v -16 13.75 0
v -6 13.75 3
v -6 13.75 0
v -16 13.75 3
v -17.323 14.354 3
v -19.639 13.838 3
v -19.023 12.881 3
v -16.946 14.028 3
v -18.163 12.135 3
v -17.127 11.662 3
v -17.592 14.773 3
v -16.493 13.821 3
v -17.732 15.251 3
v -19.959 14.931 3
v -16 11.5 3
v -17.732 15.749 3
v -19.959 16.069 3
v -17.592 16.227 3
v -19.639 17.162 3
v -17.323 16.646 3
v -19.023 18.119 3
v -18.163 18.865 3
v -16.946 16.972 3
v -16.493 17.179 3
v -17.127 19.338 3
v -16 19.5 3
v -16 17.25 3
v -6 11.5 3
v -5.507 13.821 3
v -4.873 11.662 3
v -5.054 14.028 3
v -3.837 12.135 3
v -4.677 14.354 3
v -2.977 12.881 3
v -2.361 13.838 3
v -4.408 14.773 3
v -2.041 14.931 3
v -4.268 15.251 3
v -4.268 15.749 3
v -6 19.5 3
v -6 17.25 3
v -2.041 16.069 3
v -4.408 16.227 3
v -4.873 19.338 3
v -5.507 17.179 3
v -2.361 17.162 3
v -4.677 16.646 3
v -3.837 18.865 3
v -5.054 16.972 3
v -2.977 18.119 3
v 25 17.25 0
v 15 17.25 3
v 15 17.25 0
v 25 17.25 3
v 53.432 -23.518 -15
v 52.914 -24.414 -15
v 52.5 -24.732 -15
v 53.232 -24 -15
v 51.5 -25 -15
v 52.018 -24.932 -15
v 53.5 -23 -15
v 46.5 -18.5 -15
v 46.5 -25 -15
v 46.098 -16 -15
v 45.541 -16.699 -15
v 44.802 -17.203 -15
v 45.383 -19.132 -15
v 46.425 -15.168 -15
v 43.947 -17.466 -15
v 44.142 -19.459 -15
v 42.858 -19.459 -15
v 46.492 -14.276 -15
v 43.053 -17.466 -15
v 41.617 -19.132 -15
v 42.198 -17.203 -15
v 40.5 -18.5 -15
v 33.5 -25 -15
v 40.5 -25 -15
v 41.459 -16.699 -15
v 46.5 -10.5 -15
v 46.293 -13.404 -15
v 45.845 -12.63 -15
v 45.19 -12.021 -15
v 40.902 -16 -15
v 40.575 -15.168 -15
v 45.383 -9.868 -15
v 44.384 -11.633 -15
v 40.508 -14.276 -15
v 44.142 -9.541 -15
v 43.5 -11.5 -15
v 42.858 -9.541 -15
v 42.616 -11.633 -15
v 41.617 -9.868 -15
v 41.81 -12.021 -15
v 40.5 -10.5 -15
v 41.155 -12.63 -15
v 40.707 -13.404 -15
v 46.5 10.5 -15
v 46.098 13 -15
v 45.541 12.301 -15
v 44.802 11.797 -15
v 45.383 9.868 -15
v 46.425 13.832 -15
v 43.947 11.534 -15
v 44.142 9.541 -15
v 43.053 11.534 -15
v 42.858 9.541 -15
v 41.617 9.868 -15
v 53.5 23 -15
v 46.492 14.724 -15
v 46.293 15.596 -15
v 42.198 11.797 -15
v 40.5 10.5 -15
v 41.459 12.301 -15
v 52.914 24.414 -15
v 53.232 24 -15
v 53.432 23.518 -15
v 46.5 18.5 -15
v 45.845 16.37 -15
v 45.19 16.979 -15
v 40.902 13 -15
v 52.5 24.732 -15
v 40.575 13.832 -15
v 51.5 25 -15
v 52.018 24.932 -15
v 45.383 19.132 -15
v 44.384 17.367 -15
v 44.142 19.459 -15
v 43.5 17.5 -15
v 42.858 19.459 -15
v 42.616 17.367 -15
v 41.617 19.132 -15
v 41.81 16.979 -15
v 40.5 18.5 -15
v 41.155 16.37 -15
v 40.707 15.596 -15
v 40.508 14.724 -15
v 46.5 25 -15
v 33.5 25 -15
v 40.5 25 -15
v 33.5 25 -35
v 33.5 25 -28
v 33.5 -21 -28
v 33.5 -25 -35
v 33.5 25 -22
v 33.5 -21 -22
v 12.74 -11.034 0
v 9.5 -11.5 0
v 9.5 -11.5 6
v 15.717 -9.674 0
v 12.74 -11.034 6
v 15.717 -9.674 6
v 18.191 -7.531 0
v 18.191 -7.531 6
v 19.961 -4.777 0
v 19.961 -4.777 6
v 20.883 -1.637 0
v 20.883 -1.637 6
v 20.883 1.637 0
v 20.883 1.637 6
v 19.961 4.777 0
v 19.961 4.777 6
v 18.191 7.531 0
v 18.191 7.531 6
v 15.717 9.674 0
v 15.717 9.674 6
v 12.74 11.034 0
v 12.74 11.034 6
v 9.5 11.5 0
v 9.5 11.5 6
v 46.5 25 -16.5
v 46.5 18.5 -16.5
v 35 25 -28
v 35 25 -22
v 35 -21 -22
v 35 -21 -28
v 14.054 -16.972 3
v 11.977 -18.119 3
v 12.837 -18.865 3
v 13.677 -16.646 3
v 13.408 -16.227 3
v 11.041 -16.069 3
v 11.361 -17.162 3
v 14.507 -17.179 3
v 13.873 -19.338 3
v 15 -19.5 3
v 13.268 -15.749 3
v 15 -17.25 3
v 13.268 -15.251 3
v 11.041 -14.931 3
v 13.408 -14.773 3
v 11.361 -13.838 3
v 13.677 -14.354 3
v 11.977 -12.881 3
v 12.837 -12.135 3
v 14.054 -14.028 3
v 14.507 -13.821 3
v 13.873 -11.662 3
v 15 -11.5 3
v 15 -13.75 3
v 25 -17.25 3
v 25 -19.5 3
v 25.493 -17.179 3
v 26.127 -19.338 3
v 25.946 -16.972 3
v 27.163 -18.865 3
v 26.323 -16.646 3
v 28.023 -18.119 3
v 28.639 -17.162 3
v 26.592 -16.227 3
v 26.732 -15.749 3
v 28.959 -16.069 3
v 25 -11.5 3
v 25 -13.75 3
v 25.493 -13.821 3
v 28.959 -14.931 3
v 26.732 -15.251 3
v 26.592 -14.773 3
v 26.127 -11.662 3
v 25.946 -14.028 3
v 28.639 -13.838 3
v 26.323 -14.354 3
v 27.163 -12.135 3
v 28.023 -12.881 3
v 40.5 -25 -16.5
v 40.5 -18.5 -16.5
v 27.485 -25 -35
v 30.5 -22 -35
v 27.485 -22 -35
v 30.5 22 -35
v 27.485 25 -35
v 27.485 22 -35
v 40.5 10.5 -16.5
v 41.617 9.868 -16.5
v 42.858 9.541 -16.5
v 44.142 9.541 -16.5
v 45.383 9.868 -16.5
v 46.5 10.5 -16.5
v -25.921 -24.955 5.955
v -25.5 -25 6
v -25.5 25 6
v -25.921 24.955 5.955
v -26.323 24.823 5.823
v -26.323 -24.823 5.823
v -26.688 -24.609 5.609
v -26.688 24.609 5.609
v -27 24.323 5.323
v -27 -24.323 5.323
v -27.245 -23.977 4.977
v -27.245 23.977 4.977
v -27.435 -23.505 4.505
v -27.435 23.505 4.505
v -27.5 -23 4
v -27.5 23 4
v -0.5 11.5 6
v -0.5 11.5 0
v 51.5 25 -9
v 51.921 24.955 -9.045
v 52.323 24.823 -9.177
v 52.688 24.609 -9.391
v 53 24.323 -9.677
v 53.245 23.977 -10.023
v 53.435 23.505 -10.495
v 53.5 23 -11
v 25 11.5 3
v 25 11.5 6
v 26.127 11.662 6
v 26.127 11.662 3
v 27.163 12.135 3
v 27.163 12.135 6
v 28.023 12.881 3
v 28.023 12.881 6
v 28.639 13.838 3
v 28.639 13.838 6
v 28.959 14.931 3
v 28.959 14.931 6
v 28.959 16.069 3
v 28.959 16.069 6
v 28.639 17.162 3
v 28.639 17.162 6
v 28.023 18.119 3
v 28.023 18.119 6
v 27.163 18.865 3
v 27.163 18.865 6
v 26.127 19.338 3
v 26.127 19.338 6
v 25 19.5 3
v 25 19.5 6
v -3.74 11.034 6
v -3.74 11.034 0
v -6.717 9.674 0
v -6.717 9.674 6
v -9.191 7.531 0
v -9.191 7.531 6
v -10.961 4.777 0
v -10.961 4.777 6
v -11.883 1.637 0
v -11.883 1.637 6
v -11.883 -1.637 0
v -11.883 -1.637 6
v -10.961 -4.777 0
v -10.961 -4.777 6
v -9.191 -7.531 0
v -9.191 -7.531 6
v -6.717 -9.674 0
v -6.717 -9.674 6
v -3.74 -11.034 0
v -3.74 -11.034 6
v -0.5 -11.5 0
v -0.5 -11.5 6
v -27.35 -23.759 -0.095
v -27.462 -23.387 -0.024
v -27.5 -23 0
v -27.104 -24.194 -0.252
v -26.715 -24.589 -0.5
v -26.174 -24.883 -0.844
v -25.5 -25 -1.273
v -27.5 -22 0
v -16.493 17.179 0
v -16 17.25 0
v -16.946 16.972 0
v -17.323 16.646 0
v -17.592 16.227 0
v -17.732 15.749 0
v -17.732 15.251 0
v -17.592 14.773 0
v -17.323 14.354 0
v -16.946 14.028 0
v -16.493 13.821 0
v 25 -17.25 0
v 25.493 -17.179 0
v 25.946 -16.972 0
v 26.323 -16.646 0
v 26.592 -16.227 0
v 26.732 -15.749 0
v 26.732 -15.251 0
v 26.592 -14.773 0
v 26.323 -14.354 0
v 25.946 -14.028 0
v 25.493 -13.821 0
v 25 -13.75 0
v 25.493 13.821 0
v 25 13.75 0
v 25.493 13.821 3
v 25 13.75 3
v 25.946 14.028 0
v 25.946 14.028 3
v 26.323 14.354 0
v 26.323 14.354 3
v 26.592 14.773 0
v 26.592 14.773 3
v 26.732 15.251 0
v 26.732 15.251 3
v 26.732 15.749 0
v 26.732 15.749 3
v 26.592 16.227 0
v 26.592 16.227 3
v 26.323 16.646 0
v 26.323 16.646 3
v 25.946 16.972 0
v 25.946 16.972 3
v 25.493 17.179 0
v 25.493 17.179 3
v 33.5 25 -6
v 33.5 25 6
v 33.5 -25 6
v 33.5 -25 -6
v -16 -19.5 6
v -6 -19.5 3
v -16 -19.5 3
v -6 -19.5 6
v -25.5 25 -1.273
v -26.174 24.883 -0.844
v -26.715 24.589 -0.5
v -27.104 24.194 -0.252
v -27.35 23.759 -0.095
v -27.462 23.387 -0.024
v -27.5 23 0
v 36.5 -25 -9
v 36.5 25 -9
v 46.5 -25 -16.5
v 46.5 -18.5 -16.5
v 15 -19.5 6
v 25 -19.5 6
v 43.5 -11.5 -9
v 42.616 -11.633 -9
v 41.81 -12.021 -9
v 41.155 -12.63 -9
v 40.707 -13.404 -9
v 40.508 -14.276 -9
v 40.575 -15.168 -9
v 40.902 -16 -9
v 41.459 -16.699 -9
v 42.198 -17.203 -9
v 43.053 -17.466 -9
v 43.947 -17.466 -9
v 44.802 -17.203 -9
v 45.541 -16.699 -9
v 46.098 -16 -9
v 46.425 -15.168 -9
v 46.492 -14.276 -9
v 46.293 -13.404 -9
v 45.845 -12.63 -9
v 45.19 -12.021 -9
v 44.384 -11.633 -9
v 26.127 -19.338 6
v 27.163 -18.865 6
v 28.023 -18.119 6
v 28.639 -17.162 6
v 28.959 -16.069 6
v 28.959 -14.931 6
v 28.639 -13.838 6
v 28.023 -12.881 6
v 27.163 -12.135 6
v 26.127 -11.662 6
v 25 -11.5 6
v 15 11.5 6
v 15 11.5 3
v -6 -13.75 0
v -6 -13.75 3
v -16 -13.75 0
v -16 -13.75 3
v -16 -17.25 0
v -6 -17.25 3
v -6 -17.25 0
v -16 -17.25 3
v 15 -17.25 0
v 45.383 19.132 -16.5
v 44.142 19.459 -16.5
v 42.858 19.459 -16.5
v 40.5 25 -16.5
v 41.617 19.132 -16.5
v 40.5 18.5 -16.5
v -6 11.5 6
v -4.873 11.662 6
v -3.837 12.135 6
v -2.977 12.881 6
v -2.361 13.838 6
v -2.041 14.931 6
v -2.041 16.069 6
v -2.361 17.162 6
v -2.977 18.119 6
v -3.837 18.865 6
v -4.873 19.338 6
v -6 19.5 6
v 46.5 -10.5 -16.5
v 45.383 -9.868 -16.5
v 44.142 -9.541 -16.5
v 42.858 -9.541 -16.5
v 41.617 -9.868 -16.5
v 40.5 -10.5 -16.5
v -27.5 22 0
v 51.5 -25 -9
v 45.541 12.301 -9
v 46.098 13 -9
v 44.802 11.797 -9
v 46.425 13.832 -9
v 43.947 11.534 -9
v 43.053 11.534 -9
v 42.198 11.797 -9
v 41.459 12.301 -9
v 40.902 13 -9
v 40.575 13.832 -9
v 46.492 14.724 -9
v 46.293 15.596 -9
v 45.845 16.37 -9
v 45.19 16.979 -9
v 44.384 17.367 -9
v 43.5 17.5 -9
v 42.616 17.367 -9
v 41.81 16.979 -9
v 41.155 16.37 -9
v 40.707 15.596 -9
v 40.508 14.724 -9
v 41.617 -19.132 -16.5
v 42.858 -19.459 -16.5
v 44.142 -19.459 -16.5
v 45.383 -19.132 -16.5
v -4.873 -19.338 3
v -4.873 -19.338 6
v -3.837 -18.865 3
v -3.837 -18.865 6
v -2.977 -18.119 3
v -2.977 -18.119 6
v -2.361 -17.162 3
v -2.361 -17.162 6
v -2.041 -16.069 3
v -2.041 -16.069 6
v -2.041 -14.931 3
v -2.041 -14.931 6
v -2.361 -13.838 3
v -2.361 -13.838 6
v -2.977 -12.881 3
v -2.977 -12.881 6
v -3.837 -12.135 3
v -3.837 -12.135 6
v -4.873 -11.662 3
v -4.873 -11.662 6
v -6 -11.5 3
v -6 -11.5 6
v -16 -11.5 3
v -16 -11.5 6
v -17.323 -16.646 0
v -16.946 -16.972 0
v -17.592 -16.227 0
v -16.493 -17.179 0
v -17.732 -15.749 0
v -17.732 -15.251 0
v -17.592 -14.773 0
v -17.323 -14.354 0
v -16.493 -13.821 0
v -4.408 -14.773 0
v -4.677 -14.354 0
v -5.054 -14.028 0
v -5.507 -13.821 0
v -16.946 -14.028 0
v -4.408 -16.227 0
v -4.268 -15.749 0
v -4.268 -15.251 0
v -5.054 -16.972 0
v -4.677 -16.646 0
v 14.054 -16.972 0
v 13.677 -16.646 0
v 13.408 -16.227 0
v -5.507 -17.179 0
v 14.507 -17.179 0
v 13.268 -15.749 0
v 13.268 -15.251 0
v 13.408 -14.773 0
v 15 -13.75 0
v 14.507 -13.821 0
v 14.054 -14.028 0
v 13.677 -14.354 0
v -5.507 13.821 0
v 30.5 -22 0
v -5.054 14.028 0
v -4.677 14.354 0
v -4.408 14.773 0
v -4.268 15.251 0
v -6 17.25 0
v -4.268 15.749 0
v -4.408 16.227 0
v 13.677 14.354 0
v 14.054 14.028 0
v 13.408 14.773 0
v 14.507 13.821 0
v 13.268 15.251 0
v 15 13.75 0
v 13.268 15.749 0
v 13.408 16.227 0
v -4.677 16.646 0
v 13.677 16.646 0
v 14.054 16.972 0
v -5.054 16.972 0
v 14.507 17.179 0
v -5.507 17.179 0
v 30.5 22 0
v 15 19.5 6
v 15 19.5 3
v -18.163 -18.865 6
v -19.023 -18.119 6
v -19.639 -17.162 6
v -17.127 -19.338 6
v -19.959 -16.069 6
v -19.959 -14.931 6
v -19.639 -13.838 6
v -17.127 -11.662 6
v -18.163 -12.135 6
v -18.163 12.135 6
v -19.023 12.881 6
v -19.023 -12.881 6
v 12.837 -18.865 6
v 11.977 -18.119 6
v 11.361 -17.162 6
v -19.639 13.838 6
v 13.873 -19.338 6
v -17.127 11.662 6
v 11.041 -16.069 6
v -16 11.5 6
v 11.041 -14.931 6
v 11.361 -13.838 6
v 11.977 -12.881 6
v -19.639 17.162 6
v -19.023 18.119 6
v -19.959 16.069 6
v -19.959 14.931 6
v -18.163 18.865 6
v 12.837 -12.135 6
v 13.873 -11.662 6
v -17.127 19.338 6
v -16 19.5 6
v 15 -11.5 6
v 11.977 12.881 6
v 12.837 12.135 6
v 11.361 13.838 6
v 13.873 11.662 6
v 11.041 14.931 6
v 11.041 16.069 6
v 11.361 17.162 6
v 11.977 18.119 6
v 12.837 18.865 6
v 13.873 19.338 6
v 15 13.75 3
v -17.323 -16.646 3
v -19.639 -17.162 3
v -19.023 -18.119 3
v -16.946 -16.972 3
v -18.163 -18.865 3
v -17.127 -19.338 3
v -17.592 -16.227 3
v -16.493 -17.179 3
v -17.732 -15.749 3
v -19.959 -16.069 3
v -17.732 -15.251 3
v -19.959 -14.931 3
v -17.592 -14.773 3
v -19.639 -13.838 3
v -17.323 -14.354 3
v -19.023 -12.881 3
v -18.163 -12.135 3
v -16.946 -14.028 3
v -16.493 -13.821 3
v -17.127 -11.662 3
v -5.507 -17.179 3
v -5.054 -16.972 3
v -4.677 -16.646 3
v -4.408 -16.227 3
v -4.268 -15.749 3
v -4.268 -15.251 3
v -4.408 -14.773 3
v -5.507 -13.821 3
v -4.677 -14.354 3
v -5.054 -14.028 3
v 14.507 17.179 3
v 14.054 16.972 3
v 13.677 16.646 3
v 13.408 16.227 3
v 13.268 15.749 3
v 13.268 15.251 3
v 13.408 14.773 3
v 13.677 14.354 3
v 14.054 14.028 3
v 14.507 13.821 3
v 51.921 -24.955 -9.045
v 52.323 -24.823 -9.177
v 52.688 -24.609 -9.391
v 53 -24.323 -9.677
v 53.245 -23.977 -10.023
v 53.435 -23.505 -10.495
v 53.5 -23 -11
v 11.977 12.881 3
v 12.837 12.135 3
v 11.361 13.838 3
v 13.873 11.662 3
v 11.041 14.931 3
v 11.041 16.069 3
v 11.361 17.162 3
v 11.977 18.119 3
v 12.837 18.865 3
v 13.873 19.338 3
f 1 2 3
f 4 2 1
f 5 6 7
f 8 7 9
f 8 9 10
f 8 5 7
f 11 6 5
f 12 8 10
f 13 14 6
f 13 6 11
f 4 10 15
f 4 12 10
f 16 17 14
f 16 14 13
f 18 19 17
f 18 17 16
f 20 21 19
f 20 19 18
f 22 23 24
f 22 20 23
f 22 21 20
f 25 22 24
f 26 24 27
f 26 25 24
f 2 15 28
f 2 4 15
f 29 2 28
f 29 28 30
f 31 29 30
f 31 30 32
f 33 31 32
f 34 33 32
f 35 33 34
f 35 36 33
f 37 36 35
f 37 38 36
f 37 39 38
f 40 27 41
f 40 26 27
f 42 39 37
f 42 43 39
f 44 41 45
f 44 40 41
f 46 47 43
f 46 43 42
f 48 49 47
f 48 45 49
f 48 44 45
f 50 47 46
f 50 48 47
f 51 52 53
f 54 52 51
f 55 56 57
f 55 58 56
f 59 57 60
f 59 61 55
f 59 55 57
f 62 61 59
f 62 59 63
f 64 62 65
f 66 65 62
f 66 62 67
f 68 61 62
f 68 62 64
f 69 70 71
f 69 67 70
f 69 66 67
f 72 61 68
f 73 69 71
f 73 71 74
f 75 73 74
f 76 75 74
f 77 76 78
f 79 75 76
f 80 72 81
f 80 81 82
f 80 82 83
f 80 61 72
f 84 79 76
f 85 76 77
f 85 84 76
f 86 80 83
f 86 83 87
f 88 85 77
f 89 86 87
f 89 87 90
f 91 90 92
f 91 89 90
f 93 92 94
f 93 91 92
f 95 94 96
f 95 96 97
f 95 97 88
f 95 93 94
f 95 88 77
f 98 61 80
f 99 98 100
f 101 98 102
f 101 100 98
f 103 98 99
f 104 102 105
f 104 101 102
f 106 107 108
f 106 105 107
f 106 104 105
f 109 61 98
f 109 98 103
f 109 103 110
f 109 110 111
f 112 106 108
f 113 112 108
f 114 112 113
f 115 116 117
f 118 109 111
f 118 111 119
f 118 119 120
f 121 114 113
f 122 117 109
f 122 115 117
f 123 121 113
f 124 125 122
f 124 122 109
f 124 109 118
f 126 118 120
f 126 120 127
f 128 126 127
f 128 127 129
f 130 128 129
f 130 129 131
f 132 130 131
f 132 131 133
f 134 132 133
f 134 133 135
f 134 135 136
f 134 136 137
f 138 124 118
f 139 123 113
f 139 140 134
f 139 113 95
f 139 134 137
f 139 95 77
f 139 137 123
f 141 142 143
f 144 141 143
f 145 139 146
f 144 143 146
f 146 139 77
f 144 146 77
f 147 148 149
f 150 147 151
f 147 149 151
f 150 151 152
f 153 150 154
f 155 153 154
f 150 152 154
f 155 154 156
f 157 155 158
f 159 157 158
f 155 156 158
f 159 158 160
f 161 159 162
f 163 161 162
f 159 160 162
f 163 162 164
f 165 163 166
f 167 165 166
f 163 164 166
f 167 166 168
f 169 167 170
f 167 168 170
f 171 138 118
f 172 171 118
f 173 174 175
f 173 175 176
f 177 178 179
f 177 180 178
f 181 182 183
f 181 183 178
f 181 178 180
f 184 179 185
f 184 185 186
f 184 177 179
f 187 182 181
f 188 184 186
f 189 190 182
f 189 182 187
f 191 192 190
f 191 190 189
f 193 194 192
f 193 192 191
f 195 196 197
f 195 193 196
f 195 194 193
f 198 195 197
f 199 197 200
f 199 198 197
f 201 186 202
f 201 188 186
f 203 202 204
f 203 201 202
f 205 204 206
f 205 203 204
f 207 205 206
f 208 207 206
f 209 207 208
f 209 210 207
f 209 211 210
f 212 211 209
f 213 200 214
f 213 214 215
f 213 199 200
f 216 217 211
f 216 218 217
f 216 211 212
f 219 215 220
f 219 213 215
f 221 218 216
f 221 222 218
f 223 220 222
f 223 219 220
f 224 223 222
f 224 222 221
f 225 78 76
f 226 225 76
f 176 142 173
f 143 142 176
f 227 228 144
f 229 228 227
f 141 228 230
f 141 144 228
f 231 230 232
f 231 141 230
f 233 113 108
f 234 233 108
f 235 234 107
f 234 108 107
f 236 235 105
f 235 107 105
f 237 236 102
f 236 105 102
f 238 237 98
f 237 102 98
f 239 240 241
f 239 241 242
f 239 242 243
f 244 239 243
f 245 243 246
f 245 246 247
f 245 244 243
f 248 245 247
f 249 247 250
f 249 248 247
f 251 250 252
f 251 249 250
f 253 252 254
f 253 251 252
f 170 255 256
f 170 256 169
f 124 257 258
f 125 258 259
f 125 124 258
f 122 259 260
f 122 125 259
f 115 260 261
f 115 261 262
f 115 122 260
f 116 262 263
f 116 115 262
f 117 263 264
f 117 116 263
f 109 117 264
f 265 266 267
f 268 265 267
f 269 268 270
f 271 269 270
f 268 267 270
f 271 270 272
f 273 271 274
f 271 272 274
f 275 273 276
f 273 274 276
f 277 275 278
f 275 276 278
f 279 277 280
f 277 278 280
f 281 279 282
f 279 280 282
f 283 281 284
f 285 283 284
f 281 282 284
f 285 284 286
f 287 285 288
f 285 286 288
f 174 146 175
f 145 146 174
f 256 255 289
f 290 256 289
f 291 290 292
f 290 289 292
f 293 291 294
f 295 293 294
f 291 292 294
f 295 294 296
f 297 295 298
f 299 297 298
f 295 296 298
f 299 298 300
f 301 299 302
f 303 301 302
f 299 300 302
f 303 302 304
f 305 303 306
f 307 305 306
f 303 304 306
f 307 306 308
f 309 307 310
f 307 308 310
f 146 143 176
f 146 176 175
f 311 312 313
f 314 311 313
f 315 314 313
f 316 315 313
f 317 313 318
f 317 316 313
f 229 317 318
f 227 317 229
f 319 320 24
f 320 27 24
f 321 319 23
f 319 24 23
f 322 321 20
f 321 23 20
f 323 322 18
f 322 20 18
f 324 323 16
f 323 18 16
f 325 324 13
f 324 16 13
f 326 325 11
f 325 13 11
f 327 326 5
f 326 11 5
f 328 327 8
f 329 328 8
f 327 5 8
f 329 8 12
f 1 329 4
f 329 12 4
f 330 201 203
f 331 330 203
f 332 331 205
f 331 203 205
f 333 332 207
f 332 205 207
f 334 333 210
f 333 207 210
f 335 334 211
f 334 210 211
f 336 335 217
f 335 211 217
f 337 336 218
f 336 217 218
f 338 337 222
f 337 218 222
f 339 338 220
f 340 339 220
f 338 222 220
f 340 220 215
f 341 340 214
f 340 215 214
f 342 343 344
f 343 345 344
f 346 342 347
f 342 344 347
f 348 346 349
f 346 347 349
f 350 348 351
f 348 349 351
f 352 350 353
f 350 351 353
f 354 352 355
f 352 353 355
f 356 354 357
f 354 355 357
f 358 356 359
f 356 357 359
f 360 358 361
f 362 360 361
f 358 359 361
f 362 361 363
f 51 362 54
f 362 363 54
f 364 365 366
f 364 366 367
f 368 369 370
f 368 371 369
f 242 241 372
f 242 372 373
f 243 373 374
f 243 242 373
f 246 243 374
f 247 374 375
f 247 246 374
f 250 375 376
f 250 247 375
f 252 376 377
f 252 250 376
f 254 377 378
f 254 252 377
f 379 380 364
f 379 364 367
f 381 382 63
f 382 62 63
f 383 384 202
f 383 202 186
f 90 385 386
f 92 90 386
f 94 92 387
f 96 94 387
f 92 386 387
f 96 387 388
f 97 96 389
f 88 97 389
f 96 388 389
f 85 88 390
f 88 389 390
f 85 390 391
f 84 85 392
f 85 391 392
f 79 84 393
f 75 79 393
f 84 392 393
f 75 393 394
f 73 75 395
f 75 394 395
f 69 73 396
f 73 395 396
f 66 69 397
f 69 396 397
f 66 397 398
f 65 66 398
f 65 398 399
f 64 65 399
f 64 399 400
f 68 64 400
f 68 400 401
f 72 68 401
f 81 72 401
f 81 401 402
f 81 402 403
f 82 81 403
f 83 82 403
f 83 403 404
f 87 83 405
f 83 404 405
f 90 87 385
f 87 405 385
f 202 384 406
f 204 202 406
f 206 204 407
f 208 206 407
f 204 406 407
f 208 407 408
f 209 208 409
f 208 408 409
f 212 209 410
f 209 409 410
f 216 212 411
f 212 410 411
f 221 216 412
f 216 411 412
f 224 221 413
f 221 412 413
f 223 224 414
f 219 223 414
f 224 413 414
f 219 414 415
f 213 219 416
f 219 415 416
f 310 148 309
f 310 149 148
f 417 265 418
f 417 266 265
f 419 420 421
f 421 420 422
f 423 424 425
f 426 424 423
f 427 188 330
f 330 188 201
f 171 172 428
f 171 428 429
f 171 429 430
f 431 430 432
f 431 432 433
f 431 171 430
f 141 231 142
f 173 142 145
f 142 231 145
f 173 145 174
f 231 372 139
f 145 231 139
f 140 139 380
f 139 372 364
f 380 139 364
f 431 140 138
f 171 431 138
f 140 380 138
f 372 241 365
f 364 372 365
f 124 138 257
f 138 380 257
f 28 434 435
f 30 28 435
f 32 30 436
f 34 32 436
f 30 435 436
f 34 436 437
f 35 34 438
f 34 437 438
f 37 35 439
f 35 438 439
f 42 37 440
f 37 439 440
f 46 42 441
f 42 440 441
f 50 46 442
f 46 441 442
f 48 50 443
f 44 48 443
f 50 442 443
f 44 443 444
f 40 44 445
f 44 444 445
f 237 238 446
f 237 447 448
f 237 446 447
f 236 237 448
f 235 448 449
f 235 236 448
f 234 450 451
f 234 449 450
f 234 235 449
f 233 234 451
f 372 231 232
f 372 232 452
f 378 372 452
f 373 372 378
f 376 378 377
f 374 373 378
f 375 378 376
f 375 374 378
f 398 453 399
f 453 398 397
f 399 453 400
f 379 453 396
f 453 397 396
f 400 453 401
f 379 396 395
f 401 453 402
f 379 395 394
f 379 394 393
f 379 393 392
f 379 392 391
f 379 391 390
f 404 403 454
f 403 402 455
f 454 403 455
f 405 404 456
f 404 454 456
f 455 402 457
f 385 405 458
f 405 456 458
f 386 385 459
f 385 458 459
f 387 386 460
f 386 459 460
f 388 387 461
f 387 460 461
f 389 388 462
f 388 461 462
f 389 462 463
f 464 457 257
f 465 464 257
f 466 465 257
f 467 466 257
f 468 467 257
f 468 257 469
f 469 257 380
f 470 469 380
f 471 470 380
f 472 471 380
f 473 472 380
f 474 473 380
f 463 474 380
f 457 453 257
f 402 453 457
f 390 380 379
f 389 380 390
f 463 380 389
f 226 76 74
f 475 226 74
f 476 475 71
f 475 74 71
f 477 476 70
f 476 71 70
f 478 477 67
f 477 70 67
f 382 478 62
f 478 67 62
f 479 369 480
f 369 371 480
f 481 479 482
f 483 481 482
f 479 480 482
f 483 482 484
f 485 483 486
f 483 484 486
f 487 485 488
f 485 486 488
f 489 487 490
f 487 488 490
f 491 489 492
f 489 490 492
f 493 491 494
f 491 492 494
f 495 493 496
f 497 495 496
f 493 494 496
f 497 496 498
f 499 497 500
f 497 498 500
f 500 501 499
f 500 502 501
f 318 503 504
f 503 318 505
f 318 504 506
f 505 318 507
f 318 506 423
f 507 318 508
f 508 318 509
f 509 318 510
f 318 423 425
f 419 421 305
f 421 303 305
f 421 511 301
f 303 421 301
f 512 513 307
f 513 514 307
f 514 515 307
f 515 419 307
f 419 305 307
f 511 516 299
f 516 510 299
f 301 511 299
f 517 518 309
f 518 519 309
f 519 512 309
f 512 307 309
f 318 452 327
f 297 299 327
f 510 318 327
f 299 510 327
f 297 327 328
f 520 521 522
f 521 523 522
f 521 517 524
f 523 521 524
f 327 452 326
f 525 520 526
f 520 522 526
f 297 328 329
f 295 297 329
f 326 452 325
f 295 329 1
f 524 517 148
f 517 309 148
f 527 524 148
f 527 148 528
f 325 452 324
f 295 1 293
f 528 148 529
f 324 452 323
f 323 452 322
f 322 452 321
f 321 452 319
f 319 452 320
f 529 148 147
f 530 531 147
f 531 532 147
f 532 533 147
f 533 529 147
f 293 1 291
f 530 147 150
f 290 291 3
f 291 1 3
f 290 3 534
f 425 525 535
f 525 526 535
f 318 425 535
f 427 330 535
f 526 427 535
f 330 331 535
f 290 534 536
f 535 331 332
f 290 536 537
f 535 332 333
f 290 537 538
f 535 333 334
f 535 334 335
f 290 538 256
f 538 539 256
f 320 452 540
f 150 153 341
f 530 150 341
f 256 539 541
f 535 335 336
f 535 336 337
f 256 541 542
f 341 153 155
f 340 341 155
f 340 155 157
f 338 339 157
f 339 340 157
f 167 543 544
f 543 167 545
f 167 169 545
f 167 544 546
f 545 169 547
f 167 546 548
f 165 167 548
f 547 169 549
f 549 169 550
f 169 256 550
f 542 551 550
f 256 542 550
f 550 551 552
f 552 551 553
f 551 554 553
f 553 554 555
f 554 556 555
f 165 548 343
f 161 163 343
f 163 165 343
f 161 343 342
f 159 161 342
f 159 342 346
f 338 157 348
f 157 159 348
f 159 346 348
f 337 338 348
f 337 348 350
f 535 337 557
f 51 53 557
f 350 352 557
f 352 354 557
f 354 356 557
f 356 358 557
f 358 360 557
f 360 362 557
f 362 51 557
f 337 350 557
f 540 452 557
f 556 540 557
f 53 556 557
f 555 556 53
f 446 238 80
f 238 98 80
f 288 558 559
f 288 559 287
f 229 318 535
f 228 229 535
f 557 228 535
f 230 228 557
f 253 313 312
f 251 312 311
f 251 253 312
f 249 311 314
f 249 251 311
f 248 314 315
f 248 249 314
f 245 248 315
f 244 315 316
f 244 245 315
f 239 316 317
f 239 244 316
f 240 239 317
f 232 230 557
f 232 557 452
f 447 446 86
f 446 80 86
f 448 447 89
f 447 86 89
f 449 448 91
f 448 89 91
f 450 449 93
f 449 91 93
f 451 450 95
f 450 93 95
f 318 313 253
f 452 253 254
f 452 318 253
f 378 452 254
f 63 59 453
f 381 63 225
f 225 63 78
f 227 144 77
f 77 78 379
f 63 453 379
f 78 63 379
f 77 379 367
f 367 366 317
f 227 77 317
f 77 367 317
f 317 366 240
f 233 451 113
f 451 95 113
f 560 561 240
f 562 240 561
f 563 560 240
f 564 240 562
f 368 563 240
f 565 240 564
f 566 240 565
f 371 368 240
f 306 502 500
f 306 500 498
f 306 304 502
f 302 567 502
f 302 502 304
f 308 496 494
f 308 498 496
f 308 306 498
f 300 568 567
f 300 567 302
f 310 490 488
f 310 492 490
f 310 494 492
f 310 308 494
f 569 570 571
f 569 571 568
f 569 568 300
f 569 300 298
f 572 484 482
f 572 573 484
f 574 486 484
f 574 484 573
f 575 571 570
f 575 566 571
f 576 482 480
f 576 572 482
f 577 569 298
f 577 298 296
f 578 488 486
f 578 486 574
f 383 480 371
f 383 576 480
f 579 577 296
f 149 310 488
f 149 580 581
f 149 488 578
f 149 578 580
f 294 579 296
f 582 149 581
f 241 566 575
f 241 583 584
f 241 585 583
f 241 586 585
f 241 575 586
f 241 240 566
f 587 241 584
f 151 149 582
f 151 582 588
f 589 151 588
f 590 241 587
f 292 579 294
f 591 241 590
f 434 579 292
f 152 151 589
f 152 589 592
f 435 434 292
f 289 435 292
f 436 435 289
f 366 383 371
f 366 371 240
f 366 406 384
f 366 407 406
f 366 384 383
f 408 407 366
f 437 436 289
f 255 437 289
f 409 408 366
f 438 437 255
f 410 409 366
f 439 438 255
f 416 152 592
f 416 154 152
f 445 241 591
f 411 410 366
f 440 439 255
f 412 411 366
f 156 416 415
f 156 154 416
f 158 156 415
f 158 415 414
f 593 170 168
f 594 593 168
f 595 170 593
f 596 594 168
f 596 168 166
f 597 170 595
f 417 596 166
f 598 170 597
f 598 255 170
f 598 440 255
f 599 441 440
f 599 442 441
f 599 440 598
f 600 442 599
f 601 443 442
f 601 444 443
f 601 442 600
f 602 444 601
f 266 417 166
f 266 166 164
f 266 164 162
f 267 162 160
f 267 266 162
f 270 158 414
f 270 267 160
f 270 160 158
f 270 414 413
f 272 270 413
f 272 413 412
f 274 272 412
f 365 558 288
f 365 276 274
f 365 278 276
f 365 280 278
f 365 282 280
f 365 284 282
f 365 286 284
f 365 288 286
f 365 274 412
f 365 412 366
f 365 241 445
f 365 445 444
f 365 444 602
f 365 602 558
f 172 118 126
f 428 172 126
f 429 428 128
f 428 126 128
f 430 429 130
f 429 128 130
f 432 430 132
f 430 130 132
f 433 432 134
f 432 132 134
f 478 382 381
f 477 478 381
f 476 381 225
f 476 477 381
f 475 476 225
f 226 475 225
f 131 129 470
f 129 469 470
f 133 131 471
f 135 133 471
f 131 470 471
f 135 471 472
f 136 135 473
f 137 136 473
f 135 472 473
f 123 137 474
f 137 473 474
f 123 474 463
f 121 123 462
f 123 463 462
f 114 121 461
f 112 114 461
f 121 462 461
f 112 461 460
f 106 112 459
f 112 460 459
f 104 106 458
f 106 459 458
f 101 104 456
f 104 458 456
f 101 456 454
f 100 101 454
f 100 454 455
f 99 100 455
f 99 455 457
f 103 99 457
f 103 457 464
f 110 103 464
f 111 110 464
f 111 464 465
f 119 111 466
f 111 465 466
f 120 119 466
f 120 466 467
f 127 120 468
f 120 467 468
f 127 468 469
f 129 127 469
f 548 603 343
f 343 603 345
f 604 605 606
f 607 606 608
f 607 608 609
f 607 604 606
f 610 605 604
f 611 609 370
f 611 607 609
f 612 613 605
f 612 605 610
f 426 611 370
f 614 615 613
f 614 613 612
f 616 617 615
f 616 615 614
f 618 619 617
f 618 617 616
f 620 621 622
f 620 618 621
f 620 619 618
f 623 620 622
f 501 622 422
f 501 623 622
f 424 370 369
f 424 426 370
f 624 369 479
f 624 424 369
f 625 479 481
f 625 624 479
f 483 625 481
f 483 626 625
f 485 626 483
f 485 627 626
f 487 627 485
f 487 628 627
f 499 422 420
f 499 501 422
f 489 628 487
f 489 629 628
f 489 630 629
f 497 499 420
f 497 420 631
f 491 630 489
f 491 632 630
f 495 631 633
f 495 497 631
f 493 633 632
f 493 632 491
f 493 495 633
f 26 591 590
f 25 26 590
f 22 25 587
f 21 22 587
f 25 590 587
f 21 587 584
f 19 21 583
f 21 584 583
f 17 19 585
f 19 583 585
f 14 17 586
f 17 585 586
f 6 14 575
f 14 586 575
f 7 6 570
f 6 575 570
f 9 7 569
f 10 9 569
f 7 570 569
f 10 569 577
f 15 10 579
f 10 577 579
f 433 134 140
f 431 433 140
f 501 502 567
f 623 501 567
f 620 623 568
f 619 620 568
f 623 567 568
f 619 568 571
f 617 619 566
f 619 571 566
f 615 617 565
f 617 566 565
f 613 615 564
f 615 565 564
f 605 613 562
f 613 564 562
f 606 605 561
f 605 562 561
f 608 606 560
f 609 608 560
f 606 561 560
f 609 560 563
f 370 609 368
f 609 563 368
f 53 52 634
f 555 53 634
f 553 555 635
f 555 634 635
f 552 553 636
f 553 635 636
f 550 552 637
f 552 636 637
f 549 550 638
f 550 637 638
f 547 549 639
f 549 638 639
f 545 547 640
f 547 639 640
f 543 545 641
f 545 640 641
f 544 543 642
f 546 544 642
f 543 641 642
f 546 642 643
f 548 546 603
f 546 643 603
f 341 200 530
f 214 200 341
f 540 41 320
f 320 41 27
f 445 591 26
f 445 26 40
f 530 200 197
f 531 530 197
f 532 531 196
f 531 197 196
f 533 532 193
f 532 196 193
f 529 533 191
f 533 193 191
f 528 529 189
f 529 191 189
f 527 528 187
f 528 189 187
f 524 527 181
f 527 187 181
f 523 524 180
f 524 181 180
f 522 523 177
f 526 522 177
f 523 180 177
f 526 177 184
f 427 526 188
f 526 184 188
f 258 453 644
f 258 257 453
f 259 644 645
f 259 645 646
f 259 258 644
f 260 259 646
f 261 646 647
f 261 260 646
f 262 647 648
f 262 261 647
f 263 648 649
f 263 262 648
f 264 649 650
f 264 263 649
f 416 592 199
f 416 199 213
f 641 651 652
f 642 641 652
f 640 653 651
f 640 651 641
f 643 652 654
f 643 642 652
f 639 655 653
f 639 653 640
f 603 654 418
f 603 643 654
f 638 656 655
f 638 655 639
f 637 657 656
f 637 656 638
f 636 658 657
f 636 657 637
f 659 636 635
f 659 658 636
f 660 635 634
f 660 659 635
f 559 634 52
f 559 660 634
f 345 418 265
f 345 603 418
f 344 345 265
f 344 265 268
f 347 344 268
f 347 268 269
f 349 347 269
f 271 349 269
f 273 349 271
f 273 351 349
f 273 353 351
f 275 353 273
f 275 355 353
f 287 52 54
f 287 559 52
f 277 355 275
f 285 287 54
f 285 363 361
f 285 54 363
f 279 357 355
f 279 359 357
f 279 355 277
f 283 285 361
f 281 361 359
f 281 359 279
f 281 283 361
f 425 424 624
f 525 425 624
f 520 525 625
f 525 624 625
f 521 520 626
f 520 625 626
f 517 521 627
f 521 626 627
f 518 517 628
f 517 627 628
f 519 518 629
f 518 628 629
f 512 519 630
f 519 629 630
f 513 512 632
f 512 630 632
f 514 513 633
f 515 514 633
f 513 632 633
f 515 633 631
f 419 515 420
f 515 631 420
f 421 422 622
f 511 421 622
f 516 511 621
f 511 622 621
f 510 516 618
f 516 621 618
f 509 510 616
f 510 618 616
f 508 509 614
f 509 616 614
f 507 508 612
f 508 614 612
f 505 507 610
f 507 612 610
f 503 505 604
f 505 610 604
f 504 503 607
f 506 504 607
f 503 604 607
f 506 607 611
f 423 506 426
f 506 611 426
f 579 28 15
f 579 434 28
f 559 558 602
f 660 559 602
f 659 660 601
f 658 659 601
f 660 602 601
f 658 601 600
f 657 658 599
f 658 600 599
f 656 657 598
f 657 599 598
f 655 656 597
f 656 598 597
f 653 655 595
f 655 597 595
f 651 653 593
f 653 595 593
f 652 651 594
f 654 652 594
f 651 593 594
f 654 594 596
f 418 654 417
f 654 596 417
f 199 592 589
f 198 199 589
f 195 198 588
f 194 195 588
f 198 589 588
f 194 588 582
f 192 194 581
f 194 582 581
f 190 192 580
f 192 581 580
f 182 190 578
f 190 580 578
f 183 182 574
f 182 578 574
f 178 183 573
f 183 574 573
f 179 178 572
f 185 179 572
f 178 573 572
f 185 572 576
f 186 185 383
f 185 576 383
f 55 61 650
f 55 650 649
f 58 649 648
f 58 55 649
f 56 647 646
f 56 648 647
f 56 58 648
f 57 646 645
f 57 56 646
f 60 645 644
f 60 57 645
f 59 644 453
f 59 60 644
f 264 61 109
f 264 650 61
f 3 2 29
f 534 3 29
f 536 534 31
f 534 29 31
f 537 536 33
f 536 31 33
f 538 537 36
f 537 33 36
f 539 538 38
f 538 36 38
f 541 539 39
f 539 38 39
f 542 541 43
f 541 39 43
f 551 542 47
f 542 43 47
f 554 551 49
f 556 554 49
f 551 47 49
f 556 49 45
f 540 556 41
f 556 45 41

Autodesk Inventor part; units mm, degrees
ref_plane "YZ Plane" through (0, 0, 0) normal (1, 0, 0) x (0, 1, 0)
ref_plane "XZ Plane" through (0, 0, 0) normal (0, 1, 0) x (-1, 0, 0)
ref_plane "XY Plane" through (0, 0, 0) normal (0, 0, 1) x (1, 0, 0)
sketch "Sketch1" plane through (0, 0, 0) normal (0, 0, 1) x (1, 0, 0)
  line L0 (-27.5, 25) -> (27.5, 25)
  line L1 (27.5, 25) -> (27.5, -25)
  line L2 (27.5, -25) -> (-27.5, -25)
  line L3 (-27.5, -25) -> (-27.5, 25)
  line L4 (-27.5, 25) -> (27.5, -25) construction
  line L5 (27.5, 25) -> (-27.5, -25) construction
  point P0 (0, 0)
  dimension "d0" = 55
  dimension "d1" = 50
extrude "Extrusion1" add sketch "Sketch1" along normal blind 6
sketch "Sketch2" plane through (27.5, -25, 0) normal (1, 0, 0) x (0, 0, -1)
  line L0 (-6, 50) -> (-6, 0) projected
  line L1 (-6, 0) -> (9, 0)
  line L2 (9, 0) -> (9, 50)
  line L3 (9, 50) -> (-6, 50)
  line L4 (-6, 50) -> (-6, 0)
  point P0 (0, 25)
  dimension "d4" = 15
  dimension "d5" = 50
extrude "Extrusion2" add sketch "Sketch2" along normal blind 6
sketch "Sketch4" plane through (27.5, -25, -9) normal (0, 0, -1) x (-1, 0, 0)
  line L0 (0, 0) -> (0, 50) projected
  line L1 (0, 0) -> (-26, 0)
  line L2 (-26, 0) -> (-26, 50)
  line L3 (-26, 50) -> (0, 50)
  line L4 (0, 50) -> (0, 0)
  point P0 (27.5, 25)
  dimension "d8" = 26
  dimension "d35" = 50
extrude "Extrusion3" add sketch "Sketch4" along normal blind 6
sketch "Sketch5" plane through (27.5, -25, -15) normal (0, 0, -1) x (-1, 0, 0)
  line L0 (0, 50) -> (-26, 50) projected
  line L1 (-6, 0) -> (-26, 0) projected
  line L2 (0, 50) -> (-6, 50)
  line L3 (-6, 50) -> (-6, 0)
  line L4 (-6, 0) -> (0, 0)
  line L5 (0, 0) -> (0, 50)
  point P0 (27.5, 25)
  dimension "d11" = 6
extrude "Extrusion4" add sketch "Sketch5" along normal blind 20
sketch "Sketch6" plane through (27.5, -25, -15) normal (0, 0, -1) x (-1, 0, 0)
  line L0 (-6, 0) -> (-26, 0) projected
  line L1 (-26, 50) -> (-6, 50) projected
  line L2 (-19, 0) -> (-13, 0)
  line L3 (-13, 0) -> (-13, 50)
  line L4 (-13, 50) -> (-19, 50)
  line L5 (-19, 50) -> (-19, 0)
  line L6 (-26, 50) -> (-26, 0) projected
  point P0 (27.5, 25)
  dimension "d14" = 6
  dimension "d15" = 7
extrude "Extrusion5" add sketch "Sketch6" along normal blind 1.5 contours L0 L5 L1 L3
sketch "Sketch7" plane through (33.5, -25, -15) normal (1, 0, 0) x (0, 0, -1)
  line L0 (13, 4) -> (7, 4)
  line L1 (7, 4) -> (7, 50)
  line L2 (7, 50) -> (13, 50)
  line L3 (13, 50) -> (13, 4)
  line L4 (20, 50) -> (20, 0) projected
  line L5 (0, 50) -> (20, 50) projected
  point P0 (-15, 25)
  dimension "d18" = 6
  dimension "d19" = 46
  dimension "d20" = 7
  dimension "d36" = 0
extrude "Extrusion6" add sketch "Sketch7" along normal blind 1.5
sketch "Sketch8" plane through (27.5, -25, -16.5) normal (0, 0, -1) x (-1, 0, 0)
  line L0 (-13, 0) -> (-13, 50) projected
  line L1 (-13, 25) -> (-18.895, 25)
  line L2 (-19, 0) -> (-13, 0) projected
  point P0 (27.5, 25)
  point P1 (-16, 10.5)
  point P2 (-16, 39.5)
  dimension "d23" = 10.5
  dimension "d24" = 3
hole "Hole1" at (43.5, -14.5, -16.5) at (43.5, 14.5, -16.5) direction (0, 0, 1) diameter 6 end through all counterbore diameter 10 counterbore depth 1.5
sketch "Sketch9" plane through (-27.5, -25, 0) normal (0, -1, 0) x (1, 0, 0)
  line L0 (61, -9) -> (61, 6) projected
  line L1 (0, 6) -> (61, 6) projected
  line L2 (61, 6) -> (0, 6)
  line L3 (0, 6) -> (0, 0)
  line L4 (0, 0) -> (54.9849, -35)
  line L5 (55, -35) -> (61, -35) projected
  line L6 (54.9849, -35) -> (61, -35)
  line L7 (61, -35) -> (61, 6)
  point P0 (27.5, 0)
extrude "Extrusion7" add sketch "Sketch9" against normal blind 3
ref_plane "Work Plane1" through (-27.5, 0, 6) normal (0, 1, 0) x (1, 0, 0)
mirror "Mirror1" about plane through (-27.5, 0, 6) normal (0, 1, 0) of "Extrusion7"
ref_plane "Work Plane2" through (43.5, -25, 0) normal (1, 0, 0) x (0, 0, -1)
ref_plane "Work Plane3" through (25, -25, 0) normal (1, 0, 0) x (0, 0, -1)
sketch "Sketch11" plane through (27.5, -25, -35) normal (0, 0, -1) x (-1, 0, 0)
  line L0 (0, 3) -> (0, 47) projected
  line L1 (0, 3) -> (-3, 3)
  line L2 (-3, 3) -> (-3, 47)
  line L3 (-3, 47) -> (0, 47)
  line L4 (0, 47) -> (0, 3)
  point P0 (27.5, 25)
  point P1 (0, 50)
  dimension "d39" = 3
  dimension "d40" = 44
extrude "Extrusion8" cut sketch "Sketch11" against normal blind 35
sketch "Sketch12" plane through (0, 0, 6) normal (0, 0, 1) x (1, 0, 0)
  arc A0 (15, 17.25) -> (15, 13.75) centre (15, 15.5) ccw
  arc A1 (25, 13.75) -> (25, 17.25) centre (25, 15.5) ccw
  line L0 (-27.5, -22) -> (-27.5, 22) projected
  line L1 (-27.5, 0) -> (33.5, 0)
  line L2 (33.5, 25) -> (33.5, -25) projected
  line L3 (-27.5, 25) -> (27.4849, 25) projected
  line L4 (15, 17.25) -> (25, 17.25)
  line L5 (15, 13.75) -> (25, 13.75)
  line L6 (-27.5, -25) -> (33.5, -25) projected
  line L7 (-27.5, 25) -> (33.5, 25) projected
  line L8 (25, 25) -> (25, 0)
  line L9 (25, 16) -> (29.2976, 16)
  line L10 (4.5, 25) -> (4.5, 0)
  arc A2 (-6, 13.75) -> (-6, 17.25) centre (-6, 15.5) ccw
  arc A3 (-16, 17.25) -> (-16, 13.75) centre (-16, 15.5) ccw
  line L11 (-6, 17.25) -> (-16, 17.25)
  line L12 (-6, 13.75) -> (-16, 13.75)
  arc A4 (15, -13.75) -> (15, -17.25) centre (15, -15.5) ccw
  arc A5 (25, -17.25) -> (25, -13.75) centre (25, -15.5) ccw
  line L13 (15, -17.25) -> (25, -17.25)
  line L14 (15, -13.75) -> (25, -13.75)
  arc A6 (-16, -13.75) -> (-16, -17.25) centre (-16, -15.5) ccw
  line L15 (-6, -17.25) -> (-16, -17.25)
  line L16 (-6, -13.75) -> (-16, -13.75)
  arc A7 (-6, -17.25) -> (-6, -13.75) centre (-6, -15.5) ccw
  arc A8 (-0.5, 11.5) -> (-0.5, -11.5) centre (-0.5, 0) ccw
  arc A9 (9.5, -11.5) -> (9.5, 11.5) centre (9.5, 0) ccw
  line L17 (-0.5, 11.5) -> (9.5, 11.5)
  line L18 (9.5, -11.5) -> (-0.5, -11.5)
  point P0 (0, 0)
  point P1 (-16, 16)
  point P2 (25, -16)
  point P3 (-16, -16)
  point P4 (33.5, 29)
  dimension "d43" = 3.5
  dimension "d44" = 3.5
  dimension "d49" = 8.5
  dimension "d51" = 20.5
  dimension "d52" = 15.5
  dimension "d53" = 23
  dimension "d54" = 23
  dimension "d55" = 5
  dimension "d56" = 5
extrude "Extrusion9" cut sketch "Sketch12" against normal blind 42 contours L4 L8 L5 A0 | A1 L9 L8 | L8 L9 A1 | A9 L18 A8 L1 | L1 L10 L17 A9 | L10 L1 A8 L17 | L12 A3 L11 A2 | L14 A5 L13 A4 | L16 A7 L15 A6
sketch "Sketch14" plane through (0, 0, 6) normal (0, 0, 1) x (1, 0, 0)
  arc A0 (-16, 17.25) -> (-16, 13.75) centre (-16, 15.5) ccw projected
  arc A1 (-16, 19.5) -> (-16, 11.5) centre (-16, 15.5) ccw
  arc A2 (-6, 13.75) -> (-6, 17.25) centre (-6, 15.5) ccw projected
  arc A3 (-6, 11.5) -> (-6, 19.5) centre (-6, 15.5) ccw
  line L0 (-16, 19.5) -> (-6, 19.5)
  line L1 (-6, 11.5) -> (-16, 11.5)
  arc A4 (15, 17.25) -> (15, 13.75) centre (15, 15.5) ccw projected
  arc A5 (15, -13.75) -> (15, -17.25) centre (15, -15.5) ccw projected
  arc A6 (-16, -13.75) -> (-16, -17.25) centre (-16, -15.5) ccw projected
  arc A7 (15, 19.5) -> (15, 11.5) centre (15, 15.5) ccw
  arc A8 (25, 11.5) -> (25, 19.5) centre (25, 15.5) ccw
  line L2 (15, 19.5) -> (25, 19.5)
  line L3 (25, 11.5) -> (15, 11.5)
  arc A9 (15, -11.5) -> (15, -19.5) centre (15, -15.5) ccw
  arc A10 (25, -19.5) -> (25, -11.5) centre (25, -15.5) ccw
  line L4 (15, -11.5) -> (25, -11.5)
  line L5 (25, -19.5) -> (15, -19.5)
  arc A11 (-16, -11.5) -> (-16, -19.5) centre (-16, -15.5) ccw
  arc A12 (-6, -19.5) -> (-6, -11.5) centre (-6, -15.5) ccw
  line L6 (-16, -11.5) -> (-6, -11.5)
  line L7 (-6, -19.5) -> (-16, -19.5)
  point P0 (0, 0)
  dimension "d59" = 8
  dimension "d60" = 8
  dimension "d61" = 8
  dimension "d62" = 8
  dimension "d63" = 8
  dimension "d64" = 8
  dimension "d65" = 8
  dimension "d66" = 8
extrude "Extrusion10" cut sketch "Sketch14" against normal blind 3
chamfer "Chamfer1" distance 3 angle 45 1 edges at (33.5, 0, -9)
fillet "Fillet1" radius 2 6 edges at (-27.5, -25, 3) (-27.5, 25, 3) (-27.5, 0, 6) (53.5, 25, -12) (53.5, -25, -12) (53.5, 0, -9)
properties part number "Estrutura - Suporte Z Motor v2"
